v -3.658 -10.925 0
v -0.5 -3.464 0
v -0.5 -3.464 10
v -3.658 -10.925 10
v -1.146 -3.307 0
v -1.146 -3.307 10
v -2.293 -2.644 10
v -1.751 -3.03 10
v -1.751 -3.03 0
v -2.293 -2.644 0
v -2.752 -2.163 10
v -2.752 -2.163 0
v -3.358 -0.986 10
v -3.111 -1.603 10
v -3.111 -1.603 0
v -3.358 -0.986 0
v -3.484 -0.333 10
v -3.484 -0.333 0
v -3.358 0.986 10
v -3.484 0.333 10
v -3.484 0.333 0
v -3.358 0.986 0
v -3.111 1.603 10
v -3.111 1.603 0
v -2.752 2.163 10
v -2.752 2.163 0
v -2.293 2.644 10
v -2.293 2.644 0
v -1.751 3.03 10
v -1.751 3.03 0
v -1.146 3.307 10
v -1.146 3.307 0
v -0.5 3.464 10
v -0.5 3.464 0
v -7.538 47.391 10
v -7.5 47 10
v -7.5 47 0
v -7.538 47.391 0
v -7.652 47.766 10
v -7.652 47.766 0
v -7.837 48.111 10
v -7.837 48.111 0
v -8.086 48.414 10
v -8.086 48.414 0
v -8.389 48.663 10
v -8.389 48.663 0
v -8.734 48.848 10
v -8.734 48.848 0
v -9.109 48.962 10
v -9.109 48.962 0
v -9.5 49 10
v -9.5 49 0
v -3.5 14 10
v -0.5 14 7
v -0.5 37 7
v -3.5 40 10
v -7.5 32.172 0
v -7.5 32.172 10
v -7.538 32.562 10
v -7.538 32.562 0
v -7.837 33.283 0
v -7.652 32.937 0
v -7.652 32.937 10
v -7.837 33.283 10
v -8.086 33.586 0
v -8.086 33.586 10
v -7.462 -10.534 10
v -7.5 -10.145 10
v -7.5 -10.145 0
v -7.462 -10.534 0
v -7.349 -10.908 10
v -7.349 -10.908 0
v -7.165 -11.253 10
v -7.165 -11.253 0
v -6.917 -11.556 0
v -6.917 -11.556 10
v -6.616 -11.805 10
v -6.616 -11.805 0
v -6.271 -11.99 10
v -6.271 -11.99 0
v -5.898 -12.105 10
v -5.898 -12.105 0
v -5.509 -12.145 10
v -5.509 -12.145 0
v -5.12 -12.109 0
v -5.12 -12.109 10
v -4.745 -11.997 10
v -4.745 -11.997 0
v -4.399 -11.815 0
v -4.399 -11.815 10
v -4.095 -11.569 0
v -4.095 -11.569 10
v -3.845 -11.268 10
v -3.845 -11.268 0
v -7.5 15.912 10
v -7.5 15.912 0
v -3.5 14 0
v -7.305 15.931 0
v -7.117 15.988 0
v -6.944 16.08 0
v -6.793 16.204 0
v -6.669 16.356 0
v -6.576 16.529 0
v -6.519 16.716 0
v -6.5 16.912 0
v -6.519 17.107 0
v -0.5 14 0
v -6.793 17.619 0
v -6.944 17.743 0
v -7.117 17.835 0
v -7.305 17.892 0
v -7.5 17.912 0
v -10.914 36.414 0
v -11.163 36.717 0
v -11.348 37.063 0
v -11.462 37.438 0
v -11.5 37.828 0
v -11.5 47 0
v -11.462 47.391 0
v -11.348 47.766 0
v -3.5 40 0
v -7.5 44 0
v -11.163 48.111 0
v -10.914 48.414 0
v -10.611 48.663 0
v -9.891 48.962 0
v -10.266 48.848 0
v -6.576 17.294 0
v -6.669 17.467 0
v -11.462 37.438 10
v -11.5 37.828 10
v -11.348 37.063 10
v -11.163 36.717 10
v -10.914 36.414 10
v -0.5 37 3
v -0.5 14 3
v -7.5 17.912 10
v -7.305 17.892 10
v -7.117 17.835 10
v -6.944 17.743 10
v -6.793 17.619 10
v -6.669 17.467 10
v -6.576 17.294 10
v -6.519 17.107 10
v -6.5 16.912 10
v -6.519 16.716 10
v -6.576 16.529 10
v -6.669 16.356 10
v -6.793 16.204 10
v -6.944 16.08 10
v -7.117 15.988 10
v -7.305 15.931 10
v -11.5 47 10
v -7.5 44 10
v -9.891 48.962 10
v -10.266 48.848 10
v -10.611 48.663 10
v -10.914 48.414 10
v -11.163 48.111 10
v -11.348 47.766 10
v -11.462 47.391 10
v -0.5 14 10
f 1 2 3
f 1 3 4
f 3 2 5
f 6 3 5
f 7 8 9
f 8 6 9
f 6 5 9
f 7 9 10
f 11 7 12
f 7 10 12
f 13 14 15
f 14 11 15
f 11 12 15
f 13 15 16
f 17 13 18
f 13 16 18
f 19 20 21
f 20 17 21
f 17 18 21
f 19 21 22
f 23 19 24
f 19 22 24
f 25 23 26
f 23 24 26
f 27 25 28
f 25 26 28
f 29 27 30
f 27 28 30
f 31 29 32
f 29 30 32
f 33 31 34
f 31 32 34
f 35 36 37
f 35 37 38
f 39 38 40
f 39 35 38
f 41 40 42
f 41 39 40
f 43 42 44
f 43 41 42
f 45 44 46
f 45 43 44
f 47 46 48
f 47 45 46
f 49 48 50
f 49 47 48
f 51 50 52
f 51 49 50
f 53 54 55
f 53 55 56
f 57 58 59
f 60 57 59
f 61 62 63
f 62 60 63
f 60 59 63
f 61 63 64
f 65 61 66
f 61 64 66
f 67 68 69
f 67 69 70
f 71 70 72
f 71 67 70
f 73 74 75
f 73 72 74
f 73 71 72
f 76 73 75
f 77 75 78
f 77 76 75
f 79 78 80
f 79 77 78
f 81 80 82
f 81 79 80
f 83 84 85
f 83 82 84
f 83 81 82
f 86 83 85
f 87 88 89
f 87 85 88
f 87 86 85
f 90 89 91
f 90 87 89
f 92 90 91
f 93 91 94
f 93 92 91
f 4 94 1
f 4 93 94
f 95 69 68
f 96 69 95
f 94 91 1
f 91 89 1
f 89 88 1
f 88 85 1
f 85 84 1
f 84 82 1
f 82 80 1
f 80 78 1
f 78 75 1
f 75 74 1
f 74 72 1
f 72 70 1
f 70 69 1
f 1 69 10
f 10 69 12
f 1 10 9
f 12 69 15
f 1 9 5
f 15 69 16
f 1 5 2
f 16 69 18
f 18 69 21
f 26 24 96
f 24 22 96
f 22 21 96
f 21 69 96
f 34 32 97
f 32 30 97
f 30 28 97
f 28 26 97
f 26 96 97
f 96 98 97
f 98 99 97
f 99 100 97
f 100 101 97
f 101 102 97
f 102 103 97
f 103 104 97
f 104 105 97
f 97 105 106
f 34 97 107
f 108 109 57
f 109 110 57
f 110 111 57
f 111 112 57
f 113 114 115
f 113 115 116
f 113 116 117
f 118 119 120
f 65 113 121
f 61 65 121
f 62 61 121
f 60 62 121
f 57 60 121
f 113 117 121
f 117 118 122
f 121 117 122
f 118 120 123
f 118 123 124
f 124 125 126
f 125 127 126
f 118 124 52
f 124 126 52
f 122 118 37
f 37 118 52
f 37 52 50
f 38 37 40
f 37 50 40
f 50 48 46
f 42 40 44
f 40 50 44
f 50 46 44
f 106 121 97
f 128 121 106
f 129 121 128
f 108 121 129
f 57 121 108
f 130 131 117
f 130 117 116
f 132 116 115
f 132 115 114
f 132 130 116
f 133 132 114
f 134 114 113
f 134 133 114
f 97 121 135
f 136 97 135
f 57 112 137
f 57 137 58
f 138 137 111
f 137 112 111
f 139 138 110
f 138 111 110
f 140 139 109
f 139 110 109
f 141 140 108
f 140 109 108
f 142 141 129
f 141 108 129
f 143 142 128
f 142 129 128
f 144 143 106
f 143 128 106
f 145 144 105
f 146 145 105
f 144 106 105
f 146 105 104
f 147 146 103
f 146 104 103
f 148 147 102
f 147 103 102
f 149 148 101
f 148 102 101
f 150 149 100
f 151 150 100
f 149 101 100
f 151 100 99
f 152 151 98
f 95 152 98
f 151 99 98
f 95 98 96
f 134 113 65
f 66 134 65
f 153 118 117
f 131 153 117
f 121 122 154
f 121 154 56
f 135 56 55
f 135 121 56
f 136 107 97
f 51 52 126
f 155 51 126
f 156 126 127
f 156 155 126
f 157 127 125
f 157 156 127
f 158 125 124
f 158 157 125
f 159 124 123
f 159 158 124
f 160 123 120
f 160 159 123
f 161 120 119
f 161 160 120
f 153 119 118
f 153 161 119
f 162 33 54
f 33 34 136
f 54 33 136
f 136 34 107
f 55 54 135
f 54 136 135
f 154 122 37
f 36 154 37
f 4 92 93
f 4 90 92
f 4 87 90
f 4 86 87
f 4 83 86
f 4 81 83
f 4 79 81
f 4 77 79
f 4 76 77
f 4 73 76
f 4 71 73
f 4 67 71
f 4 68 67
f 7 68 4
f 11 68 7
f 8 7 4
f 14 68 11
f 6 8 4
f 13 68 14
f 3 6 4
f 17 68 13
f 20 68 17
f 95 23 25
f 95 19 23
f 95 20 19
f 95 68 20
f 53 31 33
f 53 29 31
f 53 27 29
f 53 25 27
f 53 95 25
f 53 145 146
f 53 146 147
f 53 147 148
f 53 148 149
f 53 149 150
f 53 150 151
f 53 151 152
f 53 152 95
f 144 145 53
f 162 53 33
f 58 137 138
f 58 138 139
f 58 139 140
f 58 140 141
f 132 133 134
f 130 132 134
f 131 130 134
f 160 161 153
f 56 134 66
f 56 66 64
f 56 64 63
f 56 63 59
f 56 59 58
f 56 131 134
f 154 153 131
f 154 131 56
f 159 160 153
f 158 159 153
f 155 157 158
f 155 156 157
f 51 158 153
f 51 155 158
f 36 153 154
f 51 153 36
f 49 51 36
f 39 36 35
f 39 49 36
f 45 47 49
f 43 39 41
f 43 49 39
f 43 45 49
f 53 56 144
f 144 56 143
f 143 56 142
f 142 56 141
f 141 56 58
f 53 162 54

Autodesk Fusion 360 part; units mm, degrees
sketch "Sketch1" plane through (0, 0, 0) normal (0, 0, 1) x (1, 0, 0)
  circle A0 centre (0, 0) radius 3.5
  line L0 (-11.5, 49) -> (-11.5, 37)
  line L1 (-0.5, -3.4641) -> (-0.5, 37)
  line L2 (-0.5, -3.4641) -> (-7.5, -20)
  circle A1 centre (-7.5, 16.9115) radius 1
  line L3 (-11.5, 49) -> (-7.5, 49)
  line L4 (-11.5, 37) -> (-7.5, 33)
  line L5 (-7.5, 44) -> (-0.5, 37)
  line L6 (-7.5, -20) -> (-7.5, 33)
  line L7 (-7.5, 44) -> (-7.5, 49)
  point P0 (-7.5, 16.9115)
  dimension "d1" = 7
  dimension "d2" = 4
  dimension "d6" = 0.5
  dimension "d7" = 20
  dimension "d8" = 7
  dimension "d9" = 18.5
  dimension "d10" = 2
  dimension "d11" = 69
  dimension "d12" = 12
  dimension "d14" = 5
  dimension "d26" = 45
extrude "Extrude1" add sketch "Sketch1" along normal blind 10 contours A0 L0 L1 L2 A1 L3 L4 L5 L6 L7
sketch "Sketch2" plane through (0, 49, 0) normal (0, 1, 0) x (-1, 0, 0)
  line L0 (7.5, 0) -> (11.5, 0)
  line L1 (11.5, 0) -> (11.5, 10)
  line L2 (11.5, 10) -> (7.5, 10)
  line L3 (7.5, 10) -> (7.5, 0)
  line L4 (3.5, 0) -> (-1.5, 5)
  line L5 (-1.5, 5) -> (3.5, 10)
  line L6 (7.5, 0) -> (0.5, 0)
  line L7 (3.5, 10) -> (-2, 10)
  line L8 (-2, 10) -> (-2, 0)
  line L9 (-2, 0) -> (3.5, 0)
  line L10 (0.5, 10) -> (7.5, 10)
  point P0 (0.5, 0)
  point P1 (0.5, 10)
  dimension "d17" = 3
  dimension "d18" = 3
  dimension "d19" = 45
extrude "Extrude2" cut sketch "Sketch2" against normal blind 35 contours L4 L5 L6 L7 L8 L9 L10
fillet "Fillet1" radius 2 2 edges at (-11.5, 49, 5) (-7.5, 49, 5)
fillet "Fillet2" radius 2 3 edges at (-7.5, 33, 5) (-11.5, 37, 5) (-7.5, -20, 5)
